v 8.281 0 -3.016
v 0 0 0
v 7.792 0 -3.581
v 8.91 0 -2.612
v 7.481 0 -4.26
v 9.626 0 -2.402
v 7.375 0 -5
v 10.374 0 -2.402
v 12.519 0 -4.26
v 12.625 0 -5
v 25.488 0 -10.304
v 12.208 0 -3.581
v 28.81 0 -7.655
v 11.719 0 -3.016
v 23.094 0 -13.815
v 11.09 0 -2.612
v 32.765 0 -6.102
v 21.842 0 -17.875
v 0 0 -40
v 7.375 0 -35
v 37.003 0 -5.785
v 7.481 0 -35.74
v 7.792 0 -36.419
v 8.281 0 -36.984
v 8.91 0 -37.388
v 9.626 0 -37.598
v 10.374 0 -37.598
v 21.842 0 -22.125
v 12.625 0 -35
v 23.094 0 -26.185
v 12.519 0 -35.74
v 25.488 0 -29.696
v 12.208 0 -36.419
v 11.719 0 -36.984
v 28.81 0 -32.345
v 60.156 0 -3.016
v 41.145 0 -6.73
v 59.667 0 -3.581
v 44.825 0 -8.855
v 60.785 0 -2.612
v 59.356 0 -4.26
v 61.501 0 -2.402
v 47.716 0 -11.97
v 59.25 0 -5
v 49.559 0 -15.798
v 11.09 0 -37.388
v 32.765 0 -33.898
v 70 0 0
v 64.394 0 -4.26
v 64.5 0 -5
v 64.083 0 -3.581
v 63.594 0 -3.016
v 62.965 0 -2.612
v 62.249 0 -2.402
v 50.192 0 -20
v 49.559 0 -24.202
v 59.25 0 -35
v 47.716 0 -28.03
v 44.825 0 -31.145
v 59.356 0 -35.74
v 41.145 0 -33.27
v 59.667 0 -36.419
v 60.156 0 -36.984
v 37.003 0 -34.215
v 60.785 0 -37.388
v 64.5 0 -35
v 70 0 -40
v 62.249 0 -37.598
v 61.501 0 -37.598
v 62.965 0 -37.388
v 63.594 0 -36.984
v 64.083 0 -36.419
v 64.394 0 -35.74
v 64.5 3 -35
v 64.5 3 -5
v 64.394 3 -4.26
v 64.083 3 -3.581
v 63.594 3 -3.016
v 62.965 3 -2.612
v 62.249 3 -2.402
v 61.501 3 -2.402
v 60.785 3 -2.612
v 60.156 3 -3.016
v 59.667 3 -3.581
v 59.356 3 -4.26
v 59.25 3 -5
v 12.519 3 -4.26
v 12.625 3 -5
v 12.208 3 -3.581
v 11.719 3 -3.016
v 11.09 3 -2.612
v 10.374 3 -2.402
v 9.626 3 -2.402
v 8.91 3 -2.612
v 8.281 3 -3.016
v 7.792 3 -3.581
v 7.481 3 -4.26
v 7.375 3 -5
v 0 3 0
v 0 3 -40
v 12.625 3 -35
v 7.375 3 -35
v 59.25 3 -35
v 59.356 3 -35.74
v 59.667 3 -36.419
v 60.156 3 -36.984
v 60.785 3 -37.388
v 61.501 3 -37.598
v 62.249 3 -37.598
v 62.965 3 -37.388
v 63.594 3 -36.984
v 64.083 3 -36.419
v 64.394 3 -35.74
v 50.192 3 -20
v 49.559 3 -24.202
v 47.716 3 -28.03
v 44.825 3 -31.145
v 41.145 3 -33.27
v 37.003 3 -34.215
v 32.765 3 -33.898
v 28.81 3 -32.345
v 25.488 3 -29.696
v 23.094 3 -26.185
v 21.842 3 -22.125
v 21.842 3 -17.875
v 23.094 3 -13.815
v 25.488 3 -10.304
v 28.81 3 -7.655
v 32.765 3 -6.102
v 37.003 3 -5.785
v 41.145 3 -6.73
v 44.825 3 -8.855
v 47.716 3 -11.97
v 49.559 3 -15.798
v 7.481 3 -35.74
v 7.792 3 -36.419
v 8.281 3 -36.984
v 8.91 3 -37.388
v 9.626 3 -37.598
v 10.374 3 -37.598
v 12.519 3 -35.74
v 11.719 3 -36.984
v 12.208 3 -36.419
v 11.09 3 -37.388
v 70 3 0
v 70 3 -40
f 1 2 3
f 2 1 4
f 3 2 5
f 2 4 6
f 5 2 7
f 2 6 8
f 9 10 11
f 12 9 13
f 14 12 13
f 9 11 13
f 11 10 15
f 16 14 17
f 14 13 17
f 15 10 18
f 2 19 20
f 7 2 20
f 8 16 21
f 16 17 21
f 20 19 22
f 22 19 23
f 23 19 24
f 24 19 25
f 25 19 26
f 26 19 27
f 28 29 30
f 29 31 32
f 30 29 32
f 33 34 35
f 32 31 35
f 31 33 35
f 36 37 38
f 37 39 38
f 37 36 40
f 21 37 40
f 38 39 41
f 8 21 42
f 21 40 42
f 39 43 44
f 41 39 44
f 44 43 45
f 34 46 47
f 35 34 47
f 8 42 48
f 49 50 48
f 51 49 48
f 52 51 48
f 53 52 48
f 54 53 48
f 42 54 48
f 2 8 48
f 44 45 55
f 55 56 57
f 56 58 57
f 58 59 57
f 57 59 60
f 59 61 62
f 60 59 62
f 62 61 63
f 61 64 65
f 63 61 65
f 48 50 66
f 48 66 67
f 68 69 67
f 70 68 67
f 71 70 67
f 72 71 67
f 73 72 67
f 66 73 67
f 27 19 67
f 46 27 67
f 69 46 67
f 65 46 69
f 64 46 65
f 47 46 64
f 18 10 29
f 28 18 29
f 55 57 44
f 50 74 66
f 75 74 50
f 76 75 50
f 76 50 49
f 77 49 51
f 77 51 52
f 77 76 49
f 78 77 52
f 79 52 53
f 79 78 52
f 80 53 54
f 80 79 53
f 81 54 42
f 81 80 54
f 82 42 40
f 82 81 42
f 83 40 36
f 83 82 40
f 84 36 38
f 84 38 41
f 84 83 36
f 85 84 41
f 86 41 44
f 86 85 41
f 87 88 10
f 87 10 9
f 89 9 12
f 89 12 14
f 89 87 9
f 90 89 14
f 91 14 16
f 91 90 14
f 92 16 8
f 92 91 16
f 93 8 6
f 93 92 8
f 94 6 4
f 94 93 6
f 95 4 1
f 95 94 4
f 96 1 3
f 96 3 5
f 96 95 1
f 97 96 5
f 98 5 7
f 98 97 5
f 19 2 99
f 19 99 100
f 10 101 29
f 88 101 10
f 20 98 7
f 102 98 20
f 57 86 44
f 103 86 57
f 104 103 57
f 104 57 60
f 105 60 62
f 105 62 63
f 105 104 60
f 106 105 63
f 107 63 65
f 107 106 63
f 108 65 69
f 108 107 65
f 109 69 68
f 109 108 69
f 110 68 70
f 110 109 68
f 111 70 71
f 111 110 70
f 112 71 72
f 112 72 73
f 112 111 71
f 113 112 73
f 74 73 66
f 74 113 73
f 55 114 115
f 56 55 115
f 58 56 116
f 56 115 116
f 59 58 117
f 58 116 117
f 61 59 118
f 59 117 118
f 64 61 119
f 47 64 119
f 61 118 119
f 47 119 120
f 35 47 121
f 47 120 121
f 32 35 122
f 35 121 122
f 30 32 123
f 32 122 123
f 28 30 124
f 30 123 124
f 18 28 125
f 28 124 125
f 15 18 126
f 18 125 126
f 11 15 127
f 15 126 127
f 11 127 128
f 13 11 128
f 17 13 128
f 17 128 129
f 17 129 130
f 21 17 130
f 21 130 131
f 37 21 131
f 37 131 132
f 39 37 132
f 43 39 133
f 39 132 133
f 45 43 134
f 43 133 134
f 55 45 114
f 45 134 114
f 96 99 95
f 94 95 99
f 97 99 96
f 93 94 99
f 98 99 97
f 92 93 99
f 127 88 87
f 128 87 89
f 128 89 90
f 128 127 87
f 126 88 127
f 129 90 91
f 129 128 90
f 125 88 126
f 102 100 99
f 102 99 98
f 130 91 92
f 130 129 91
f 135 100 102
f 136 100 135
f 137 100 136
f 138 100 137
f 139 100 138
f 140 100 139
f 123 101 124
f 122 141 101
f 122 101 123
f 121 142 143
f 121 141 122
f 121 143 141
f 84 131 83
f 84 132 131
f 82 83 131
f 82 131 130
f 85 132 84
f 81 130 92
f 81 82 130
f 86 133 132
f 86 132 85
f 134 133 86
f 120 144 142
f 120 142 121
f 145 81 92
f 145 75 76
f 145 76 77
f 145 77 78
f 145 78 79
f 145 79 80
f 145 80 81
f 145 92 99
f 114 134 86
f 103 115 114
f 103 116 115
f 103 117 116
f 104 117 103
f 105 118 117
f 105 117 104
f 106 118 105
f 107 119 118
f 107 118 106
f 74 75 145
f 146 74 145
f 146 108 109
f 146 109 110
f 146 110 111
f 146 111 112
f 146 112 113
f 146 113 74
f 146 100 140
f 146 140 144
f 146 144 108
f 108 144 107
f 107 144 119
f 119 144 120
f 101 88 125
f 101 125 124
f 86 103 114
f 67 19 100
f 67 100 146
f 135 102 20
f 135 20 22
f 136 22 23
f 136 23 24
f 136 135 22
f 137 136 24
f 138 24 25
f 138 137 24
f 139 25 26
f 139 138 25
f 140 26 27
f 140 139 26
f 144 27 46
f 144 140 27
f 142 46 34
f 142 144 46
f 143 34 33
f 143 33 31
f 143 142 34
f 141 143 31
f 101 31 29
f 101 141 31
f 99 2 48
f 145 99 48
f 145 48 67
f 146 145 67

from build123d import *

# Parameters (mm, degrees)
SKETCH1_W           = 70
SKETCH1_H           = 40
BOSS_EXTRUDE1_DEPTH = 3
SKETCH2_R           = 14.255
CUT_EXTRUDE1_DEPTH  = 3


with BuildPart() as part:
    # Sketch1 → Boss-Extrude1 (new body)
    with BuildSketch(Plane(origin=(0, 0, 0), x_dir=(1, 0, 0), z_dir=(0, 1, 0))):
        with Locations((35, 20)):
            Rectangle(SKETCH1_W, SKETCH1_H)
    extrude(amount=BOSS_EXTRUDE1_DEPTH)

    # Sketch2 → Cut-Extrude1 (cut)
    with BuildSketch(Plane(origin=(0, 3, 0), x_dir=(1, 0, 0), z_dir=(0, 1, 0))):
        with Locations((35.9375, 20)):
            Circle(SKETCH2_R)
        with BuildLine():
            Line((12.625, 35), (12.625, 5))
            ThreePointArc((12.625, 5), (10, 2.375), (7.375, 5))
            Line((7.375, 5), (7.375, 35))
            ThreePointArc((7.375, 35), (10, 37.625), (12.625, 35))
        make_face()
        with BuildLine():
            Line((64.5, 35), (64.5, 5))
            ThreePointArc((64.5, 5), (61.875, 2.375), (59.25, 5))
            Line((59.25, 5), (59.25, 35))
            ThreePointArc((59.25, 35), (61.875, 37.625), (64.5, 35))
        make_face()
    extrude(amount=-CUT_EXTRUDE1_DEPTH, mode=Mode.SUBTRACT)


solid = part.part
